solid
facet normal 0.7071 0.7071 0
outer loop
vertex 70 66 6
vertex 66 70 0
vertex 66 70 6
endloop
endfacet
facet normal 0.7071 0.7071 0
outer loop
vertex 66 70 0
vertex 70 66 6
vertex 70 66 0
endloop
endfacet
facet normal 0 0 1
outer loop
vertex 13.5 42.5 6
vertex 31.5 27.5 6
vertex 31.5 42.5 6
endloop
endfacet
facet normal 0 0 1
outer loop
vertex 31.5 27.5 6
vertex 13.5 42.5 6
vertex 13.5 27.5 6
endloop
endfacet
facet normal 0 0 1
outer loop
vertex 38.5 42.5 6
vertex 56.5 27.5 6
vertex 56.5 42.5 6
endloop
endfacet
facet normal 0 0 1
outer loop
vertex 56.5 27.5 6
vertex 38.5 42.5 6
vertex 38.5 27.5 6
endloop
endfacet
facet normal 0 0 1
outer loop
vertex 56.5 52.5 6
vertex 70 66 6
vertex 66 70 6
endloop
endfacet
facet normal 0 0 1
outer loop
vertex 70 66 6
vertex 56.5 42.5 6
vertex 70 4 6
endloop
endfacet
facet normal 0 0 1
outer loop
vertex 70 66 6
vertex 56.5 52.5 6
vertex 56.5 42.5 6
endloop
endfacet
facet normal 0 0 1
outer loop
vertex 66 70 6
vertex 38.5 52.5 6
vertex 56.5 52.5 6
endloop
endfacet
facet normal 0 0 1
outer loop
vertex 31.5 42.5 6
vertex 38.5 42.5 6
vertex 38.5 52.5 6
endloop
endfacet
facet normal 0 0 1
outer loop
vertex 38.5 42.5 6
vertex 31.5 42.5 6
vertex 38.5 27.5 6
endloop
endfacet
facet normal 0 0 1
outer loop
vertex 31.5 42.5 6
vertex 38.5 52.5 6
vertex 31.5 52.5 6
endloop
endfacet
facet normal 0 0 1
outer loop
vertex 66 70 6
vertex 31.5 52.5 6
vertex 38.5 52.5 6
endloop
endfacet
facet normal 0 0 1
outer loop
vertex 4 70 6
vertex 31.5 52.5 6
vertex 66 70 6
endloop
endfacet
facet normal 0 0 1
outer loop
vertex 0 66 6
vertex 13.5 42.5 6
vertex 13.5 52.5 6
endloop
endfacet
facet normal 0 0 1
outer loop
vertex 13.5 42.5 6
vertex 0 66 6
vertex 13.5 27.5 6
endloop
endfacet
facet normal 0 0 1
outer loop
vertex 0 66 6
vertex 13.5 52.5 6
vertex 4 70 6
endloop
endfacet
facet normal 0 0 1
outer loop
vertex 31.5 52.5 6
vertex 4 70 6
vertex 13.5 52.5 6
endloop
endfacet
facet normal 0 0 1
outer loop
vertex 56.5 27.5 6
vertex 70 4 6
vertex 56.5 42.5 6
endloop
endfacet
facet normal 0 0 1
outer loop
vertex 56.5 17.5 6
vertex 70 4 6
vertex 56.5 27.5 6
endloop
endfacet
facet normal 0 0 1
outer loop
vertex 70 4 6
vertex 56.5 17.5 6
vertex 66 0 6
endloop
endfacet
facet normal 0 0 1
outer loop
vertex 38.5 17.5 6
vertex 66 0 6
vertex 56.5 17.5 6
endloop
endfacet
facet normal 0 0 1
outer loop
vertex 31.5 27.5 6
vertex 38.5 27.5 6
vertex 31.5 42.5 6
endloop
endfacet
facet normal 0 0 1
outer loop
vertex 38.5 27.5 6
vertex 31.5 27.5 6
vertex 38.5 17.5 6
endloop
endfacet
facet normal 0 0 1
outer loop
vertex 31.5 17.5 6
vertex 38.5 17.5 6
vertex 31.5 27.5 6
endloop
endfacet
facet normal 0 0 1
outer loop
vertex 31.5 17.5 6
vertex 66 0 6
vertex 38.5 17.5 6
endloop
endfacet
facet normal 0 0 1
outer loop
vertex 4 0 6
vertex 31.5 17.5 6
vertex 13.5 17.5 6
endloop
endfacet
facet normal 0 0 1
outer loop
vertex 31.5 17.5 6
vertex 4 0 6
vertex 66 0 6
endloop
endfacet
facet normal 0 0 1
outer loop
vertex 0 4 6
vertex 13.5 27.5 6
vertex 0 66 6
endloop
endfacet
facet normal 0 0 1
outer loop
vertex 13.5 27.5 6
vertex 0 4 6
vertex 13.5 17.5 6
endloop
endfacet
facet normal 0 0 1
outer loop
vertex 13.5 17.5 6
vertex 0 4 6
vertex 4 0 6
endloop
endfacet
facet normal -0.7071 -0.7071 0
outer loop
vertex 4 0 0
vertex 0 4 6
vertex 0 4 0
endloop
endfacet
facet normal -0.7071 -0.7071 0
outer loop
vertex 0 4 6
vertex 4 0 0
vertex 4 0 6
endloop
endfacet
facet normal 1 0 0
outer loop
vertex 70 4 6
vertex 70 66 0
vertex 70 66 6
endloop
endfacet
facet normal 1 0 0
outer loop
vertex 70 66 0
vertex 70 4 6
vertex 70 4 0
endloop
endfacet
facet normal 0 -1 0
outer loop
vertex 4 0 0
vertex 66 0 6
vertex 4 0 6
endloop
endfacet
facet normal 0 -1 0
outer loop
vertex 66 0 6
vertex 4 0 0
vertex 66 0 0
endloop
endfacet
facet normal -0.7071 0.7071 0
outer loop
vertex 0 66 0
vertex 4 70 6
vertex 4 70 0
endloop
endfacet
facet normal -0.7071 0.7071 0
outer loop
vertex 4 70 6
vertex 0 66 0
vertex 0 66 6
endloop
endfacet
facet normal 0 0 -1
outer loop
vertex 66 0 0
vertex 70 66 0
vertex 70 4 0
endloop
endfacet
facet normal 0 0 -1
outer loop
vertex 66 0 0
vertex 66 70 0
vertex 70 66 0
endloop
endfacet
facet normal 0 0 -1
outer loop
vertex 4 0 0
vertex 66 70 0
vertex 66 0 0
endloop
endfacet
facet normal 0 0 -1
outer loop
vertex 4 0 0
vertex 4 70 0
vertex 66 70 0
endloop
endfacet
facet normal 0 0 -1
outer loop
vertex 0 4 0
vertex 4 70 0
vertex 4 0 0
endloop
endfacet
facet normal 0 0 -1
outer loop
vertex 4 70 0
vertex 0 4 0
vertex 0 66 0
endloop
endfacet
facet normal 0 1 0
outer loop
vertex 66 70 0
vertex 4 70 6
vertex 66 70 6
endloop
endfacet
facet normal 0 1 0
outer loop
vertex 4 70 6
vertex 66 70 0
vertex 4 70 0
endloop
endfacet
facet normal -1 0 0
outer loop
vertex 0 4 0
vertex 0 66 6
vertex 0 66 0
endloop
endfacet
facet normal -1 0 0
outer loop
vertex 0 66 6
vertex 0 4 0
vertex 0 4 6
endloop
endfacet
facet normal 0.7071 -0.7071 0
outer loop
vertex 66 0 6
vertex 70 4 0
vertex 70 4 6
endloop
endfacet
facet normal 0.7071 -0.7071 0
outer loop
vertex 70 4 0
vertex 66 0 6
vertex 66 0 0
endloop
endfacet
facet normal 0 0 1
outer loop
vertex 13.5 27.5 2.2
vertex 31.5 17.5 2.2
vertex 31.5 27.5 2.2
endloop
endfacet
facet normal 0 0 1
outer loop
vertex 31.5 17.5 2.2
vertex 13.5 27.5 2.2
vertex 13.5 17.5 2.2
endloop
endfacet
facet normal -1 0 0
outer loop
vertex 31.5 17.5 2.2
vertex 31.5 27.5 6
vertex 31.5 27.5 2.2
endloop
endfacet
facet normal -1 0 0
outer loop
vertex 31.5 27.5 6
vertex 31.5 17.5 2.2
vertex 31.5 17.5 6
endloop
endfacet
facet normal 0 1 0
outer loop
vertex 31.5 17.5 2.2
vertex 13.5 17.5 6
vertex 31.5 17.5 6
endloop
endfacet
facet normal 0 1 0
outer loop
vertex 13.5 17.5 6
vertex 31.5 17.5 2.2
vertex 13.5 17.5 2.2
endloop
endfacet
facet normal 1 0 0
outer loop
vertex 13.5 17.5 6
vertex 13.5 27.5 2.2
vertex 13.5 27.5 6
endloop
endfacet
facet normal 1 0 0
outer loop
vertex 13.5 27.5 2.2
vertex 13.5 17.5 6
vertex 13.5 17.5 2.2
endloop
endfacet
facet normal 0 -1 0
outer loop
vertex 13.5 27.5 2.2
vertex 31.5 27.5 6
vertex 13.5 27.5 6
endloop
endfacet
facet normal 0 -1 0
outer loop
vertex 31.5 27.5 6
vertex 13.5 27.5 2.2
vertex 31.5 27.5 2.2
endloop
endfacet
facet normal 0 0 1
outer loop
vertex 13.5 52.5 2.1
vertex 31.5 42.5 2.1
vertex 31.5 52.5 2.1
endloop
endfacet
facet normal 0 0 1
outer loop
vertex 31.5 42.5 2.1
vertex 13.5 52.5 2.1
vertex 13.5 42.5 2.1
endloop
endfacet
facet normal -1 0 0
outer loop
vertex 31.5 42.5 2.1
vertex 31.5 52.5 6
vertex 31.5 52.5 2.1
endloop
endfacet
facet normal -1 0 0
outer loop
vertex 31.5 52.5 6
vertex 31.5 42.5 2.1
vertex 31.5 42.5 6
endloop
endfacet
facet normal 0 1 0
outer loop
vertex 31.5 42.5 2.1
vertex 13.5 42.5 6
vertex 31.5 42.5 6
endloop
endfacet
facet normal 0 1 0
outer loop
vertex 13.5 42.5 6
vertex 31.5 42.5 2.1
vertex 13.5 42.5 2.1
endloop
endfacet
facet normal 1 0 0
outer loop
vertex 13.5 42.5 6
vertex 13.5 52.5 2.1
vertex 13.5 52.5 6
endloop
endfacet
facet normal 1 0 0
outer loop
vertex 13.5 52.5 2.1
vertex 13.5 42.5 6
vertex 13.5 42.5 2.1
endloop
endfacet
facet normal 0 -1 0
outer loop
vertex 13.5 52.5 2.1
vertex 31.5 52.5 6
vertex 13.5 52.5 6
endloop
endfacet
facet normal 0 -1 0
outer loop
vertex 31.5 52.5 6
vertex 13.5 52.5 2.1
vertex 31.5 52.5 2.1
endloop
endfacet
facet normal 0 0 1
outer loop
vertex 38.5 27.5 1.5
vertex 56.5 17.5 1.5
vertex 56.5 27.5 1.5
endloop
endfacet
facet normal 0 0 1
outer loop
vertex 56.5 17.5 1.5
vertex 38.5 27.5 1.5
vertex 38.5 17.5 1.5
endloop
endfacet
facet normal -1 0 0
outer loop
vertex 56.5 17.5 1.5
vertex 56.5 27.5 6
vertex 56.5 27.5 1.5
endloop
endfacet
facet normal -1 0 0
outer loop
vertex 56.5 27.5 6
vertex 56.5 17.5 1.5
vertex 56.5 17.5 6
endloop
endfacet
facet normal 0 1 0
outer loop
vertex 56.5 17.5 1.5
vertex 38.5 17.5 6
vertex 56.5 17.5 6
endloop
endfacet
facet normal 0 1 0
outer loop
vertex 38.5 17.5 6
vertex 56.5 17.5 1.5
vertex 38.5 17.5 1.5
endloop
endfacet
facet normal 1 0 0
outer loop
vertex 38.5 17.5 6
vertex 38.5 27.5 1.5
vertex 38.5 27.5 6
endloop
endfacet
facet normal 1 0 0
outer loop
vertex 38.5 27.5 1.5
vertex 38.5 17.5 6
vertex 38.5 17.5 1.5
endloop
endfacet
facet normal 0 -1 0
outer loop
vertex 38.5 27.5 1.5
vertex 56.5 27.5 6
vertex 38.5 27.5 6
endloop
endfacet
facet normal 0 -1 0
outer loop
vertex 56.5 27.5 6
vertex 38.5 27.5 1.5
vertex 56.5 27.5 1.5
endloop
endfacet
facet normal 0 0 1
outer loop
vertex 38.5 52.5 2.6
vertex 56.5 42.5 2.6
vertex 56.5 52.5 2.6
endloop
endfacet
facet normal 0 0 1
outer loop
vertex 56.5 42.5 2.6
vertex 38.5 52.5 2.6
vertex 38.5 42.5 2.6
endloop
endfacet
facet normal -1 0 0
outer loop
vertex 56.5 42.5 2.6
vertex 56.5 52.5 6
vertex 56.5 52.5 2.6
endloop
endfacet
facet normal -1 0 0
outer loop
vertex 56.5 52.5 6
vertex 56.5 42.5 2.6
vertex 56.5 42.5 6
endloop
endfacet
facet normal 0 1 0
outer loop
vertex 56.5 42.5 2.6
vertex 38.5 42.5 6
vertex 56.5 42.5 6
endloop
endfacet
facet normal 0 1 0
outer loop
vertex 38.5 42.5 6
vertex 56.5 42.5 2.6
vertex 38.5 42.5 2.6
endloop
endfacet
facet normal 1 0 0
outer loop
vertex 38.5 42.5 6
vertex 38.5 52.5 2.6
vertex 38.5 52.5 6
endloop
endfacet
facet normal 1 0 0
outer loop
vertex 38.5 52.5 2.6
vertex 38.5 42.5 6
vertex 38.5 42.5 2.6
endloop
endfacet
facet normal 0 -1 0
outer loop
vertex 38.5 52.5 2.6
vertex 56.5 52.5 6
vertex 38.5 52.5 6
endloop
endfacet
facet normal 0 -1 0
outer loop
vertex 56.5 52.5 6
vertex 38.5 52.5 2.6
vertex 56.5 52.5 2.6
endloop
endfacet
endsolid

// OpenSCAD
$fn = 32;

// ----------------------------------------------------------------------
// Windowed plate: 4 voids, 70 x 70 x 6 mm
// ----------------------------------------------------------------------

// --- parameters (mm) ---
plate_l = 70;             // plate length, X
plate_w = 70;             // plate width, Y
plate_t = 6;              // plate thickness, Z
edge_margin = 10;         // wall from the plate edge to any window
win_l = 18;               // pocket length
win_w = 10;               // pocket width
pitch_x = 25;             // grid pitch along X
pitch_y = 25;             // grid pitch along Y
depth_1 = 3.8;            // depth of void 1 (full thickness = through)
depth_2 = 3.9;            // depth of void 2 (full thickness = through)
depth_3 = 4.5;            // depth of void 3 (full thickness = through)
depth_4 = 3.4;            // depth of void 4 (full thickness = through)
corner_c = 4;             // corner chamfer of the plate

profile = [[4, 0], [66, 0], [70, 4], [70, 66], [66, 70], [4, 70], [0, 66], [0, 4]];  // primary outline, 8 points, counter clockwise
void_1 = [[13.5, 17.5], [31.5, 17.5], [31.5, 27.5], [13.5, 27.5]];  // pocket at grid node 0,0, 4 points
void_2 = [[13.5, 42.5], [31.5, 42.5], [31.5, 52.5], [13.5, 52.5]];  // pocket at grid node 0,1, 4 points
void_3 = [[38.5, 17.5], [56.5, 17.5], [56.5, 27.5], [38.5, 27.5]];  // pocket at grid node 1,0, 4 points
void_4 = [[38.5, 42.5], [56.5, 42.5], [56.5, 52.5], [38.5, 52.5]];  // pocket at grid node 1,1, 4 points

// --- the one profile operation ---
difference() {
  linear_extrude(height = plate_t) polygon(points = profile);
  translate([0, 0, plate_t - depth_1])
    linear_extrude(height = depth_1 + 1) polygon(points = void_1);
  translate([0, 0, plate_t - depth_2])
    linear_extrude(height = depth_2 + 1) polygon(points = void_2);
  translate([0, 0, plate_t - depth_3])
    linear_extrude(height = depth_3 + 1) polygon(points = void_3);
  translate([0, 0, plate_t - depth_4])
    linear_extrude(height = depth_4 + 1) polygon(points = void_4);
}
